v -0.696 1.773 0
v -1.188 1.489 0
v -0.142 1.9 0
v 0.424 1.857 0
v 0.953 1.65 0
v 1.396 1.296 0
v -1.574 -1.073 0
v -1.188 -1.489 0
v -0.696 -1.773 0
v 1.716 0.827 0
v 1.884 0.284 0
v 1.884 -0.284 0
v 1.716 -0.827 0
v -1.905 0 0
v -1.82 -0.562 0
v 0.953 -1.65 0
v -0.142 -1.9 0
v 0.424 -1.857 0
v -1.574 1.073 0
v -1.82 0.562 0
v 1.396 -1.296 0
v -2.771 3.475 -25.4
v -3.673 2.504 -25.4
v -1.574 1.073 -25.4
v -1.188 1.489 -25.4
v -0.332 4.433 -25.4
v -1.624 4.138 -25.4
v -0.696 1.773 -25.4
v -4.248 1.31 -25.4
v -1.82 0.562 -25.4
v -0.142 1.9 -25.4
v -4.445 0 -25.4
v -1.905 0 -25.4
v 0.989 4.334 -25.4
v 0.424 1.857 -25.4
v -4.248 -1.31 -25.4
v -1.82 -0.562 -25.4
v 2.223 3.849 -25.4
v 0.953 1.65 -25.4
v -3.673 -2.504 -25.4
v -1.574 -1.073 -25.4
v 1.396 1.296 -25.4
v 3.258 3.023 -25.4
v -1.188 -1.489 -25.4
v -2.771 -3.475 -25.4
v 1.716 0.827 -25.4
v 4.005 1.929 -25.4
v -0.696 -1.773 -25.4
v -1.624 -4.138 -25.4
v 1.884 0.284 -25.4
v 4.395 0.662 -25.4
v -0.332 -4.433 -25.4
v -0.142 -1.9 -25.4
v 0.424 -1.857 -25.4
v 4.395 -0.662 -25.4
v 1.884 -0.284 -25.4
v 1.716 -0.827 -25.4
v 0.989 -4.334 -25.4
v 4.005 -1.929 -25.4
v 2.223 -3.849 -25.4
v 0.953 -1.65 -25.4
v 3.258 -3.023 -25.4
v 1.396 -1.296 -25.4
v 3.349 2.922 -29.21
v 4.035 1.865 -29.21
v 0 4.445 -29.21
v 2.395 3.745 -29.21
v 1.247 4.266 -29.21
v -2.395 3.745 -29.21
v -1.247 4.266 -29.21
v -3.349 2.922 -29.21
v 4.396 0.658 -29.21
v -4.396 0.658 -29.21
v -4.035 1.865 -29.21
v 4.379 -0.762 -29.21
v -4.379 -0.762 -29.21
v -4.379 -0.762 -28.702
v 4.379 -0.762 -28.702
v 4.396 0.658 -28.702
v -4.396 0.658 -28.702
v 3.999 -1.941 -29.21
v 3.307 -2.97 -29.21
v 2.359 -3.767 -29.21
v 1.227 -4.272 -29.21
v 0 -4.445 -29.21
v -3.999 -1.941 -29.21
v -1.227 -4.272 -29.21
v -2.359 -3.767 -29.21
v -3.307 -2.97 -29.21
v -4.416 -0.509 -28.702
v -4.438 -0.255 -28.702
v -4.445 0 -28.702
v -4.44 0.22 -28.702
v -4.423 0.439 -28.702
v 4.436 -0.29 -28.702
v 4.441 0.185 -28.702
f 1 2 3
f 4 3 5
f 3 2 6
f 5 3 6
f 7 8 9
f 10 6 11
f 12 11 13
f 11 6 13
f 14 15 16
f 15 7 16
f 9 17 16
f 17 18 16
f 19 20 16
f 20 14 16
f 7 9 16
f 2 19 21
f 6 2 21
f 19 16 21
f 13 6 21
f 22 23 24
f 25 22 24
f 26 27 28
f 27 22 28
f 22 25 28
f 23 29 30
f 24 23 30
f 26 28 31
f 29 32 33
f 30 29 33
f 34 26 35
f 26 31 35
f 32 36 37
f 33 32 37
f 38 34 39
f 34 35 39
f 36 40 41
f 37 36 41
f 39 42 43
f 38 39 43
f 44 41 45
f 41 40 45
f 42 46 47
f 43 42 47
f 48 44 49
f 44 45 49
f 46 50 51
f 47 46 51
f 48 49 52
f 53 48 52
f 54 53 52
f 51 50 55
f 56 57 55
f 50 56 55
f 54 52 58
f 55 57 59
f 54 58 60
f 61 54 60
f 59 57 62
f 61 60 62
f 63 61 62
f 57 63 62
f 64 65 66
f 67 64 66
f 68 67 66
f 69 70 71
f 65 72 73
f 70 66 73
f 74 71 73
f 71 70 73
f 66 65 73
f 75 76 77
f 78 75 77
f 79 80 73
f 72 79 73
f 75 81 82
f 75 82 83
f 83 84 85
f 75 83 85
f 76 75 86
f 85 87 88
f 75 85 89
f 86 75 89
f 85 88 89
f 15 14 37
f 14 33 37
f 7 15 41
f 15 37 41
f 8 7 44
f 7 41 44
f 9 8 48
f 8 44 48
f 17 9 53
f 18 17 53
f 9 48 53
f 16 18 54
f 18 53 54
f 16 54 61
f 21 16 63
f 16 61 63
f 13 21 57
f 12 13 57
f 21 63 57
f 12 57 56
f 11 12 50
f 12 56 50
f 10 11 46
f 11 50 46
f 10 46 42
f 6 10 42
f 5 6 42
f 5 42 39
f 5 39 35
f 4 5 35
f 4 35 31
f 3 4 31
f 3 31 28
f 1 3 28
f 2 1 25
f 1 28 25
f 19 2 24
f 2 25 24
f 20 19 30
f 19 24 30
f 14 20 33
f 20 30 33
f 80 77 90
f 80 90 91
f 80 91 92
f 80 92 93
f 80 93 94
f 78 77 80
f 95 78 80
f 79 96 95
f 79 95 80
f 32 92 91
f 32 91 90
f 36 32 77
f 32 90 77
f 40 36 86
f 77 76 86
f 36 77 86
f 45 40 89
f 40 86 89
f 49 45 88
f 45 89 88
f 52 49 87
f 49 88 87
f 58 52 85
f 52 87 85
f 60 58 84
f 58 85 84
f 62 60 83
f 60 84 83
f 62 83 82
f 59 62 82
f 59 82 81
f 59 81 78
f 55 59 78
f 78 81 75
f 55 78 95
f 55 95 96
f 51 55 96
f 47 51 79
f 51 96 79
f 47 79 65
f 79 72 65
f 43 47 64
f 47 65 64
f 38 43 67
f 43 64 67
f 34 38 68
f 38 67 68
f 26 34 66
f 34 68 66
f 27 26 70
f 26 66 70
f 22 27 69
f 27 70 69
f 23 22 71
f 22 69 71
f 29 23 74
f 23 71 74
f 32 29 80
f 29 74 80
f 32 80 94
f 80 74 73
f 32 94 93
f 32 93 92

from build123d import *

# Parameters (mm, degrees)
CUT_EXTRUDE1_DEPTH = 127


with BuildPart() as part:
    # Sketch2 → Revolve1 (revolve)
    with BuildSketch(Plane(origin=(0, 0, 0), x_dir=(1, 0, 0), z_dir=(0, 1, 0)), mode=Mode.PRIVATE) as revolve1_sk:
        Polygon((0, 0), (1.905, 0), (1.905, 25.4), (4.445, 25.4), (4.445, 29.21), (0, 29.21), align=None)
    revolve(revolve1_sk.sketch.rotate(Axis((0, 0, -29.21), (0, 0, 1)), 180), axis=Axis((0, 0, -29.21), (0, 0, 1)))

    # Sketch3 → Cut-Extrude1 (cut, symmetric)
    with BuildSketch(Plane(origin=(0, 0, 0), x_dir=(0, 0, -1), z_dir=(1, 0, 0))):
        Polygon((29.21, 0.657737685), (29.21, 0), (29.21, -0.762), (28.702, -0.762), (28.702, 0.657737685), align=None)
    extrude(amount=CUT_EXTRUDE1_DEPTH, both=True, mode=Mode.SUBTRACT)


solid = part.part
